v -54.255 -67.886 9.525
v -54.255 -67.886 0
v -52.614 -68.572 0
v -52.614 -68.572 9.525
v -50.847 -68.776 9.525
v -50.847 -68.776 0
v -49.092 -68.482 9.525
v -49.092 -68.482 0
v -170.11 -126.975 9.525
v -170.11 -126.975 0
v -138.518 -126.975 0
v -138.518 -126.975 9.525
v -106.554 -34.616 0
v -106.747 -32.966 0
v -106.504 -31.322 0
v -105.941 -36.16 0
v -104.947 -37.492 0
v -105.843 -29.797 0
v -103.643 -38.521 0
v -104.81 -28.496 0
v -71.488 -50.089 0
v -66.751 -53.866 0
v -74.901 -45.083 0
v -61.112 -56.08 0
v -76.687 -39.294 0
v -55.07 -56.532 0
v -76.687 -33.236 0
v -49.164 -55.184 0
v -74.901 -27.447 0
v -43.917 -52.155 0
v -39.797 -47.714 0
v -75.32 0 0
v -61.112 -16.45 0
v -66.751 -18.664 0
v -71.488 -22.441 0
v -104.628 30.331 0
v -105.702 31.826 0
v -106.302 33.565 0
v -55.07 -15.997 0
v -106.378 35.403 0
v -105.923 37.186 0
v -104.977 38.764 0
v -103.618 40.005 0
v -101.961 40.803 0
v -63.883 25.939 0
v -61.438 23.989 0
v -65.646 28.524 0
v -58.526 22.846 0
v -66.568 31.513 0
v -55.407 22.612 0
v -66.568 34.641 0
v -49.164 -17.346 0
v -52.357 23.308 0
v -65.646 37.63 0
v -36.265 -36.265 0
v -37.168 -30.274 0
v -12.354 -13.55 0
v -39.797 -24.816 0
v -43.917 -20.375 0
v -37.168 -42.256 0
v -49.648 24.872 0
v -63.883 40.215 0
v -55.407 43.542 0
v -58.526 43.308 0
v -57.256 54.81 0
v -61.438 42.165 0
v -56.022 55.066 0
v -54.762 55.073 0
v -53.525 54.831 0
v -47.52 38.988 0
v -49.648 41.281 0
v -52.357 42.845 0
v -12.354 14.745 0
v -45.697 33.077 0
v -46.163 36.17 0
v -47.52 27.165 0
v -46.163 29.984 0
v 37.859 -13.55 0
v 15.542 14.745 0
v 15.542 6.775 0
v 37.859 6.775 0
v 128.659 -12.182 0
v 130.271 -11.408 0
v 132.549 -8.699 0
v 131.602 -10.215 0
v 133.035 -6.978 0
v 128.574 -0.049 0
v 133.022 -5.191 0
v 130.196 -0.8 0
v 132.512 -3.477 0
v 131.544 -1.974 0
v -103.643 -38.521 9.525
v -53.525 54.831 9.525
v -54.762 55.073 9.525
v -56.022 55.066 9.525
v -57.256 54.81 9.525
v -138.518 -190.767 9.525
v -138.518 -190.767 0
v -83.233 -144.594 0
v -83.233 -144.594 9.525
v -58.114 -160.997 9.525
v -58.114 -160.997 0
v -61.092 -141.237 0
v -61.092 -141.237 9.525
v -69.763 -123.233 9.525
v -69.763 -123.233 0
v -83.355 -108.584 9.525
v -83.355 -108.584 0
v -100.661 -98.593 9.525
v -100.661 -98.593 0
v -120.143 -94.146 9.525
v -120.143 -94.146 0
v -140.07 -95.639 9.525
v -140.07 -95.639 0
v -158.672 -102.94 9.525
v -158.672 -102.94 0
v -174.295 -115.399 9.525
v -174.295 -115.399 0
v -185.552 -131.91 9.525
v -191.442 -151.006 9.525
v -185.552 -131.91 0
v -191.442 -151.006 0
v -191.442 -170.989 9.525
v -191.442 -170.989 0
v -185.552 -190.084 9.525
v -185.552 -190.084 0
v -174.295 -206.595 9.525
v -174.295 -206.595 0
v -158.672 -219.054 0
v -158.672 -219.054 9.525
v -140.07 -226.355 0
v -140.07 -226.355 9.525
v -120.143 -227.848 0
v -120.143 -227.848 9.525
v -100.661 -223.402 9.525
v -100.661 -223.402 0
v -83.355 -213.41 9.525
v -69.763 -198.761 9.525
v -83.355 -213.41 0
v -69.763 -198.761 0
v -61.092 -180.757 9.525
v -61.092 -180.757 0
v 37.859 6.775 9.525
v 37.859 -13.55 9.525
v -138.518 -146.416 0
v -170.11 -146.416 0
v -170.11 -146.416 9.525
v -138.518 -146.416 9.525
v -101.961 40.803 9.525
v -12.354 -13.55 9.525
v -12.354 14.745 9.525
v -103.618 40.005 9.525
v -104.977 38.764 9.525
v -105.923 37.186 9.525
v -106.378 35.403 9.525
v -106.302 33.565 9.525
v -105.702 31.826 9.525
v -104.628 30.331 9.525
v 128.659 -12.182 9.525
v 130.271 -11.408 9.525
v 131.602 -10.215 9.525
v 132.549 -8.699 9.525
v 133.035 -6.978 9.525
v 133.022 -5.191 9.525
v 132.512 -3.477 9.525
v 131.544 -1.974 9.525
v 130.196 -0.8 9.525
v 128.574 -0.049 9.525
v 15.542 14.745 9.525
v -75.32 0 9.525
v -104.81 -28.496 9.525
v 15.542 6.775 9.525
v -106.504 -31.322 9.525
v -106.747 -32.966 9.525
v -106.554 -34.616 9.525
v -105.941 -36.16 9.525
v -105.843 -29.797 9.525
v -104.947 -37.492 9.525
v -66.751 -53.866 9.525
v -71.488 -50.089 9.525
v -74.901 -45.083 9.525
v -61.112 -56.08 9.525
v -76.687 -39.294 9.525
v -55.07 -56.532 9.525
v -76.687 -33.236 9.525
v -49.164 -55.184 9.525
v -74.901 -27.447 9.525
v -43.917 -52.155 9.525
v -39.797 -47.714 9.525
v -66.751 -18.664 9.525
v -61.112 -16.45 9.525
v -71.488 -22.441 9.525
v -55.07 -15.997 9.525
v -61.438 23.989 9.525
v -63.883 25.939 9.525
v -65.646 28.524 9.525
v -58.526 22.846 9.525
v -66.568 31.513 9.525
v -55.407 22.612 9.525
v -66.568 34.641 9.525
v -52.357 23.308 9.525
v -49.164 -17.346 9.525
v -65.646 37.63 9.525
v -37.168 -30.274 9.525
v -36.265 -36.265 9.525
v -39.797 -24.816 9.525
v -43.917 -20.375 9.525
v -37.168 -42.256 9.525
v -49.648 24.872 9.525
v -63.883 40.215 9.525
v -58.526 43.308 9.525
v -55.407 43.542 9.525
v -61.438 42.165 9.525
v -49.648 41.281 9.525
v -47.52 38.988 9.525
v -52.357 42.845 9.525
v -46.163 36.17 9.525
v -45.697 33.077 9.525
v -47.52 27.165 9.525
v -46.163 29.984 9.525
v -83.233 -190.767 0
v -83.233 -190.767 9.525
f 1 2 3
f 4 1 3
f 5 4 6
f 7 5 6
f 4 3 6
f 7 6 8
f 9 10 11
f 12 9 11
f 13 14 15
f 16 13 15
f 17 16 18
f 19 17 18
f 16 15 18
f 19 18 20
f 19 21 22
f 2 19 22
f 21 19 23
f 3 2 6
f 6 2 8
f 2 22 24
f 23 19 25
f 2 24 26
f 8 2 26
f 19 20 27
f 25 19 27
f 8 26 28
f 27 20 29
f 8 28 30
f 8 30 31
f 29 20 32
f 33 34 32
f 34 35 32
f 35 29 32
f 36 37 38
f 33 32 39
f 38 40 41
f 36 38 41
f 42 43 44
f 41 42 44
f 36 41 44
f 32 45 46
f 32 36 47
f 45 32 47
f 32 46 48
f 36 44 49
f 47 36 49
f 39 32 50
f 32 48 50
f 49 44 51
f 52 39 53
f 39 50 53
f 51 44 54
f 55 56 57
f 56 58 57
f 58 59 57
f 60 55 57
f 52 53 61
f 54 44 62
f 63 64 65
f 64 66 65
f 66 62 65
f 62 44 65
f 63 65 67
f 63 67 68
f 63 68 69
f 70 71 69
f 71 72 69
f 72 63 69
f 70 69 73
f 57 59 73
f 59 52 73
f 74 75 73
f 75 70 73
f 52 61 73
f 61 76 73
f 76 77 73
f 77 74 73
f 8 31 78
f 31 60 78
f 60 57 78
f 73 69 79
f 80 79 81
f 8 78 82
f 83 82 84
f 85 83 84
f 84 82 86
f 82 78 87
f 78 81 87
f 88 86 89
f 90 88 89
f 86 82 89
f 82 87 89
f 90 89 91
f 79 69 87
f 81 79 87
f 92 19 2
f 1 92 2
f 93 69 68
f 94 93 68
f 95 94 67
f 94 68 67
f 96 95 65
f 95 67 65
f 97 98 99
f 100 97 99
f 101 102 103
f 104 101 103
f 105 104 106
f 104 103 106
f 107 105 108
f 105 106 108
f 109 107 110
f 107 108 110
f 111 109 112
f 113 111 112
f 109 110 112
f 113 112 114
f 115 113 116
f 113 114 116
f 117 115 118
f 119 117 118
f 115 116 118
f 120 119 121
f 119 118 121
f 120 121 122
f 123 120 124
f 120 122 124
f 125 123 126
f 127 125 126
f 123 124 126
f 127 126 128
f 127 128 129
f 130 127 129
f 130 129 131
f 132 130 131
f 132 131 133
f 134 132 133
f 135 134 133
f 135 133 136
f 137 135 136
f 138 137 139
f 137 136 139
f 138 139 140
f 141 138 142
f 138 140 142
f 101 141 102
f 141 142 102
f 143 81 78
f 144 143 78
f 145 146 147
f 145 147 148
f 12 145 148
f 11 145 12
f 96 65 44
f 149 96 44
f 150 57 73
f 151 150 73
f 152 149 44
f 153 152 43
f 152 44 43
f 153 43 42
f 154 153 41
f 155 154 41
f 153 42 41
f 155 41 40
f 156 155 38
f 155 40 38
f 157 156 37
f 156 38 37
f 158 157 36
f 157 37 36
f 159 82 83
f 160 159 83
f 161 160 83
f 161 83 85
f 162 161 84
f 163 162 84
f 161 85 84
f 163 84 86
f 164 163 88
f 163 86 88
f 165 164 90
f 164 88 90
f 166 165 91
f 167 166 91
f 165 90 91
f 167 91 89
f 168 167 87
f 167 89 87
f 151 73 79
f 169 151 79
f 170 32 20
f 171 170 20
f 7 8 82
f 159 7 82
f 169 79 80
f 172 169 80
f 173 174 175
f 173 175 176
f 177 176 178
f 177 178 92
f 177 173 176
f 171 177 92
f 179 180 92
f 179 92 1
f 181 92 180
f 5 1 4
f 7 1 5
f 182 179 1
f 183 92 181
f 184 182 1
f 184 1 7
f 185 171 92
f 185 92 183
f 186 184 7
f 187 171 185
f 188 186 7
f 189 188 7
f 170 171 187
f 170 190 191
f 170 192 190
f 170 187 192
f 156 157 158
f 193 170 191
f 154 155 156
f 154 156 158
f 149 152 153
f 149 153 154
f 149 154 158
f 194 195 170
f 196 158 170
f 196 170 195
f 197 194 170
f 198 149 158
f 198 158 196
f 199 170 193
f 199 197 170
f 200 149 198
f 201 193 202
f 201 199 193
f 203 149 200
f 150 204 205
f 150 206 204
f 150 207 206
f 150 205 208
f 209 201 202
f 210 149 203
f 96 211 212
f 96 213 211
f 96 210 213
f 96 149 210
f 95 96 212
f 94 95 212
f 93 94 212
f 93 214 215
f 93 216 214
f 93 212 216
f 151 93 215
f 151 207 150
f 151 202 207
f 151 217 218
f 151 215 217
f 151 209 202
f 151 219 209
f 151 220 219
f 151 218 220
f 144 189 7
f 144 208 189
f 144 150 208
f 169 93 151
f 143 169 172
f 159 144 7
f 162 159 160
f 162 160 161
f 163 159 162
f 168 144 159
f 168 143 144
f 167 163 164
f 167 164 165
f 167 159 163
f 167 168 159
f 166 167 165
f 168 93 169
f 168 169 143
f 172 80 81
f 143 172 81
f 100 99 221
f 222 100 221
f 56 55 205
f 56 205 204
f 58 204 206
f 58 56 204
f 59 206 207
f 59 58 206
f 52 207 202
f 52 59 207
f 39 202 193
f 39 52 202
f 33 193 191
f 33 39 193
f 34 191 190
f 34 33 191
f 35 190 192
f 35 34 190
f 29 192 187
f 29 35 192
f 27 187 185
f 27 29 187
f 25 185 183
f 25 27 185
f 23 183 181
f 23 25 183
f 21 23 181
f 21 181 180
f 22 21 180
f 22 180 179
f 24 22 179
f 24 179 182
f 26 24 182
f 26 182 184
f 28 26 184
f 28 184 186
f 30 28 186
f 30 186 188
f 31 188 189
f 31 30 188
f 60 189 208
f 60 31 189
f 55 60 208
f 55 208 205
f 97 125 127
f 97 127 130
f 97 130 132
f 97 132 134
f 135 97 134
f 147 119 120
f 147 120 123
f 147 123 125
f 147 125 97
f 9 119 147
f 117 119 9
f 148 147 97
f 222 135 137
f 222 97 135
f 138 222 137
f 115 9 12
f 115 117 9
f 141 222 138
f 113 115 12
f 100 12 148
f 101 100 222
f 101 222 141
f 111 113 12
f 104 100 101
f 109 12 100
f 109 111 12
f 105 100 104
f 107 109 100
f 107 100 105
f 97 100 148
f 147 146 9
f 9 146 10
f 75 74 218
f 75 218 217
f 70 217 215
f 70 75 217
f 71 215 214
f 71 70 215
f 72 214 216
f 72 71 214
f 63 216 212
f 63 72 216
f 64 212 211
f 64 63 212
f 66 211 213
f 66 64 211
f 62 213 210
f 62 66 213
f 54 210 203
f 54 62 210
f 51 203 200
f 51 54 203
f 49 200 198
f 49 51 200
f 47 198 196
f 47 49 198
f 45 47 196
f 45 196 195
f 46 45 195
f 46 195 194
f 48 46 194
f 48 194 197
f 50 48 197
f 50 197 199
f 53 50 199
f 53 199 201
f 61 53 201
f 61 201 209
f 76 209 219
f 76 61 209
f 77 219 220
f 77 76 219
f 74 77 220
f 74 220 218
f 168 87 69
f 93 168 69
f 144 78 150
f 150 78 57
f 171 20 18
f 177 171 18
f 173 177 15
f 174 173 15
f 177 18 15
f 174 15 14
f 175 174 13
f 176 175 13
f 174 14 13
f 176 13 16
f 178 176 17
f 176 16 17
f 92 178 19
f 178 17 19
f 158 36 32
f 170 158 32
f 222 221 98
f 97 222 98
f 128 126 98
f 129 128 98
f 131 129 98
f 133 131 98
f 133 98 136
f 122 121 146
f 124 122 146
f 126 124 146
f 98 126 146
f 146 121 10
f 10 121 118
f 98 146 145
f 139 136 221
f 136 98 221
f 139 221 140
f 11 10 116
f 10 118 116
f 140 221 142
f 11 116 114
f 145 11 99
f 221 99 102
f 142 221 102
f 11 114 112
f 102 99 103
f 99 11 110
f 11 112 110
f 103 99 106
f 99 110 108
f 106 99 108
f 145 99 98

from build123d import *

# Parameters (mm, degrees)
F0_R     = 20.324324422
F0_R_2   = 10.4940599903
F1_DEPTH = 9.525
F2_R     = 67.0385979525
F2_W     = 31.5919071436
F2_H     = 19.4411873817
F3_DEPTH = 9.525


# Not quite as in the source:
# - a length typed as a fraction of an inch, garbled in the dataset ("3 / 203.2 mm" for 3/8 in), is restored


with BuildPart() as f1:
    # F0 (on Top) → F1 (new body)
    with BuildSketch(Plane.XY):
        with BuildLine():
            Line((128.5741976681, -0.0486427593), (-53.5251772372, 54.8306196901))
            ThreePointArc((-53.5251772372, 54.8306196901), (-55.3921510201, 55.100625175), (-57.2560646842, 54.8102462485))
            Line((-57.2560646842, 54.8102462485), (-101.960576079, 40.803295241))
            ThreePointArc((-101.960576079, 40.803295241), (-106.2154403374, 36.3114148976), (-104.6284180017, 30.3312628107))
            Line((-104.6284180017, 30.3312628107), (-75.319558382, 0))
            Line((-75.319558382, 0), (-104.8098202684, -28.4962070709))
            ThreePointArc((-104.8098202684, -28.4962070709), (-106.7047048987, -33.7970240568), (-103.6426431598, -38.5206906821))
            Line((-103.6426431598, -38.5206906821), (-54.2549128038, -67.8863703831))
            ThreePointArc((-54.2549128038, -67.8863703831), (-51.7372753813, -68.7364841392), (-49.0922061501, -68.4819250078))
            Line((-49.0922061501, -68.4819250078), (128.659276857, -12.1821500059))
            ThreePointArc((128.659276857, -12.1821500059), (133.0917430276, -6.0840179977), (128.5741976681, -0.0486427593))
        make_face()
        with Locations((-56.5892979503, -36.2649746239)):
            Circle(F0_R, mode=Mode.SUBTRACT)
        Polygon((-12.3540004715, -13.5495513678), (-12.3540004715, 14.7451004013), (15.5421346426, 14.7451004013), (15.5421346426, 6.7747756839), (37.8590412438, 6.7747756839), (37.8590412438, -13.5495513678), align=None, mode=Mode.SUBTRACT)
        with Locations((-56.1907812953, 33.0768451095)):
            Circle(F0_R_2, mode=Mode.SUBTRACT)
    extrude(amount=F1_DEPTH)


with BuildPart() as f3:
    # F2 (on Top) → F3 (new body)
    with BuildSketch(Plane.XY):
        with Locations((-125.1525729895, -160.9972268343)):
            Circle(F2_R)
        Polygon((-138.5183781385, -190.7665282488), (-83.2325294614, -144.5937305689), (-83.2325294614, -190.7665282488), align=None, mode=Mode.SUBTRACT)
        with Locations((-154.3143317103, -136.6957575083)):
            Rectangle(F2_W, F2_H, mode=Mode.SUBTRACT)
    extrude(amount=F3_DEPTH)


solid = Compound([f1.part, f3.part])
